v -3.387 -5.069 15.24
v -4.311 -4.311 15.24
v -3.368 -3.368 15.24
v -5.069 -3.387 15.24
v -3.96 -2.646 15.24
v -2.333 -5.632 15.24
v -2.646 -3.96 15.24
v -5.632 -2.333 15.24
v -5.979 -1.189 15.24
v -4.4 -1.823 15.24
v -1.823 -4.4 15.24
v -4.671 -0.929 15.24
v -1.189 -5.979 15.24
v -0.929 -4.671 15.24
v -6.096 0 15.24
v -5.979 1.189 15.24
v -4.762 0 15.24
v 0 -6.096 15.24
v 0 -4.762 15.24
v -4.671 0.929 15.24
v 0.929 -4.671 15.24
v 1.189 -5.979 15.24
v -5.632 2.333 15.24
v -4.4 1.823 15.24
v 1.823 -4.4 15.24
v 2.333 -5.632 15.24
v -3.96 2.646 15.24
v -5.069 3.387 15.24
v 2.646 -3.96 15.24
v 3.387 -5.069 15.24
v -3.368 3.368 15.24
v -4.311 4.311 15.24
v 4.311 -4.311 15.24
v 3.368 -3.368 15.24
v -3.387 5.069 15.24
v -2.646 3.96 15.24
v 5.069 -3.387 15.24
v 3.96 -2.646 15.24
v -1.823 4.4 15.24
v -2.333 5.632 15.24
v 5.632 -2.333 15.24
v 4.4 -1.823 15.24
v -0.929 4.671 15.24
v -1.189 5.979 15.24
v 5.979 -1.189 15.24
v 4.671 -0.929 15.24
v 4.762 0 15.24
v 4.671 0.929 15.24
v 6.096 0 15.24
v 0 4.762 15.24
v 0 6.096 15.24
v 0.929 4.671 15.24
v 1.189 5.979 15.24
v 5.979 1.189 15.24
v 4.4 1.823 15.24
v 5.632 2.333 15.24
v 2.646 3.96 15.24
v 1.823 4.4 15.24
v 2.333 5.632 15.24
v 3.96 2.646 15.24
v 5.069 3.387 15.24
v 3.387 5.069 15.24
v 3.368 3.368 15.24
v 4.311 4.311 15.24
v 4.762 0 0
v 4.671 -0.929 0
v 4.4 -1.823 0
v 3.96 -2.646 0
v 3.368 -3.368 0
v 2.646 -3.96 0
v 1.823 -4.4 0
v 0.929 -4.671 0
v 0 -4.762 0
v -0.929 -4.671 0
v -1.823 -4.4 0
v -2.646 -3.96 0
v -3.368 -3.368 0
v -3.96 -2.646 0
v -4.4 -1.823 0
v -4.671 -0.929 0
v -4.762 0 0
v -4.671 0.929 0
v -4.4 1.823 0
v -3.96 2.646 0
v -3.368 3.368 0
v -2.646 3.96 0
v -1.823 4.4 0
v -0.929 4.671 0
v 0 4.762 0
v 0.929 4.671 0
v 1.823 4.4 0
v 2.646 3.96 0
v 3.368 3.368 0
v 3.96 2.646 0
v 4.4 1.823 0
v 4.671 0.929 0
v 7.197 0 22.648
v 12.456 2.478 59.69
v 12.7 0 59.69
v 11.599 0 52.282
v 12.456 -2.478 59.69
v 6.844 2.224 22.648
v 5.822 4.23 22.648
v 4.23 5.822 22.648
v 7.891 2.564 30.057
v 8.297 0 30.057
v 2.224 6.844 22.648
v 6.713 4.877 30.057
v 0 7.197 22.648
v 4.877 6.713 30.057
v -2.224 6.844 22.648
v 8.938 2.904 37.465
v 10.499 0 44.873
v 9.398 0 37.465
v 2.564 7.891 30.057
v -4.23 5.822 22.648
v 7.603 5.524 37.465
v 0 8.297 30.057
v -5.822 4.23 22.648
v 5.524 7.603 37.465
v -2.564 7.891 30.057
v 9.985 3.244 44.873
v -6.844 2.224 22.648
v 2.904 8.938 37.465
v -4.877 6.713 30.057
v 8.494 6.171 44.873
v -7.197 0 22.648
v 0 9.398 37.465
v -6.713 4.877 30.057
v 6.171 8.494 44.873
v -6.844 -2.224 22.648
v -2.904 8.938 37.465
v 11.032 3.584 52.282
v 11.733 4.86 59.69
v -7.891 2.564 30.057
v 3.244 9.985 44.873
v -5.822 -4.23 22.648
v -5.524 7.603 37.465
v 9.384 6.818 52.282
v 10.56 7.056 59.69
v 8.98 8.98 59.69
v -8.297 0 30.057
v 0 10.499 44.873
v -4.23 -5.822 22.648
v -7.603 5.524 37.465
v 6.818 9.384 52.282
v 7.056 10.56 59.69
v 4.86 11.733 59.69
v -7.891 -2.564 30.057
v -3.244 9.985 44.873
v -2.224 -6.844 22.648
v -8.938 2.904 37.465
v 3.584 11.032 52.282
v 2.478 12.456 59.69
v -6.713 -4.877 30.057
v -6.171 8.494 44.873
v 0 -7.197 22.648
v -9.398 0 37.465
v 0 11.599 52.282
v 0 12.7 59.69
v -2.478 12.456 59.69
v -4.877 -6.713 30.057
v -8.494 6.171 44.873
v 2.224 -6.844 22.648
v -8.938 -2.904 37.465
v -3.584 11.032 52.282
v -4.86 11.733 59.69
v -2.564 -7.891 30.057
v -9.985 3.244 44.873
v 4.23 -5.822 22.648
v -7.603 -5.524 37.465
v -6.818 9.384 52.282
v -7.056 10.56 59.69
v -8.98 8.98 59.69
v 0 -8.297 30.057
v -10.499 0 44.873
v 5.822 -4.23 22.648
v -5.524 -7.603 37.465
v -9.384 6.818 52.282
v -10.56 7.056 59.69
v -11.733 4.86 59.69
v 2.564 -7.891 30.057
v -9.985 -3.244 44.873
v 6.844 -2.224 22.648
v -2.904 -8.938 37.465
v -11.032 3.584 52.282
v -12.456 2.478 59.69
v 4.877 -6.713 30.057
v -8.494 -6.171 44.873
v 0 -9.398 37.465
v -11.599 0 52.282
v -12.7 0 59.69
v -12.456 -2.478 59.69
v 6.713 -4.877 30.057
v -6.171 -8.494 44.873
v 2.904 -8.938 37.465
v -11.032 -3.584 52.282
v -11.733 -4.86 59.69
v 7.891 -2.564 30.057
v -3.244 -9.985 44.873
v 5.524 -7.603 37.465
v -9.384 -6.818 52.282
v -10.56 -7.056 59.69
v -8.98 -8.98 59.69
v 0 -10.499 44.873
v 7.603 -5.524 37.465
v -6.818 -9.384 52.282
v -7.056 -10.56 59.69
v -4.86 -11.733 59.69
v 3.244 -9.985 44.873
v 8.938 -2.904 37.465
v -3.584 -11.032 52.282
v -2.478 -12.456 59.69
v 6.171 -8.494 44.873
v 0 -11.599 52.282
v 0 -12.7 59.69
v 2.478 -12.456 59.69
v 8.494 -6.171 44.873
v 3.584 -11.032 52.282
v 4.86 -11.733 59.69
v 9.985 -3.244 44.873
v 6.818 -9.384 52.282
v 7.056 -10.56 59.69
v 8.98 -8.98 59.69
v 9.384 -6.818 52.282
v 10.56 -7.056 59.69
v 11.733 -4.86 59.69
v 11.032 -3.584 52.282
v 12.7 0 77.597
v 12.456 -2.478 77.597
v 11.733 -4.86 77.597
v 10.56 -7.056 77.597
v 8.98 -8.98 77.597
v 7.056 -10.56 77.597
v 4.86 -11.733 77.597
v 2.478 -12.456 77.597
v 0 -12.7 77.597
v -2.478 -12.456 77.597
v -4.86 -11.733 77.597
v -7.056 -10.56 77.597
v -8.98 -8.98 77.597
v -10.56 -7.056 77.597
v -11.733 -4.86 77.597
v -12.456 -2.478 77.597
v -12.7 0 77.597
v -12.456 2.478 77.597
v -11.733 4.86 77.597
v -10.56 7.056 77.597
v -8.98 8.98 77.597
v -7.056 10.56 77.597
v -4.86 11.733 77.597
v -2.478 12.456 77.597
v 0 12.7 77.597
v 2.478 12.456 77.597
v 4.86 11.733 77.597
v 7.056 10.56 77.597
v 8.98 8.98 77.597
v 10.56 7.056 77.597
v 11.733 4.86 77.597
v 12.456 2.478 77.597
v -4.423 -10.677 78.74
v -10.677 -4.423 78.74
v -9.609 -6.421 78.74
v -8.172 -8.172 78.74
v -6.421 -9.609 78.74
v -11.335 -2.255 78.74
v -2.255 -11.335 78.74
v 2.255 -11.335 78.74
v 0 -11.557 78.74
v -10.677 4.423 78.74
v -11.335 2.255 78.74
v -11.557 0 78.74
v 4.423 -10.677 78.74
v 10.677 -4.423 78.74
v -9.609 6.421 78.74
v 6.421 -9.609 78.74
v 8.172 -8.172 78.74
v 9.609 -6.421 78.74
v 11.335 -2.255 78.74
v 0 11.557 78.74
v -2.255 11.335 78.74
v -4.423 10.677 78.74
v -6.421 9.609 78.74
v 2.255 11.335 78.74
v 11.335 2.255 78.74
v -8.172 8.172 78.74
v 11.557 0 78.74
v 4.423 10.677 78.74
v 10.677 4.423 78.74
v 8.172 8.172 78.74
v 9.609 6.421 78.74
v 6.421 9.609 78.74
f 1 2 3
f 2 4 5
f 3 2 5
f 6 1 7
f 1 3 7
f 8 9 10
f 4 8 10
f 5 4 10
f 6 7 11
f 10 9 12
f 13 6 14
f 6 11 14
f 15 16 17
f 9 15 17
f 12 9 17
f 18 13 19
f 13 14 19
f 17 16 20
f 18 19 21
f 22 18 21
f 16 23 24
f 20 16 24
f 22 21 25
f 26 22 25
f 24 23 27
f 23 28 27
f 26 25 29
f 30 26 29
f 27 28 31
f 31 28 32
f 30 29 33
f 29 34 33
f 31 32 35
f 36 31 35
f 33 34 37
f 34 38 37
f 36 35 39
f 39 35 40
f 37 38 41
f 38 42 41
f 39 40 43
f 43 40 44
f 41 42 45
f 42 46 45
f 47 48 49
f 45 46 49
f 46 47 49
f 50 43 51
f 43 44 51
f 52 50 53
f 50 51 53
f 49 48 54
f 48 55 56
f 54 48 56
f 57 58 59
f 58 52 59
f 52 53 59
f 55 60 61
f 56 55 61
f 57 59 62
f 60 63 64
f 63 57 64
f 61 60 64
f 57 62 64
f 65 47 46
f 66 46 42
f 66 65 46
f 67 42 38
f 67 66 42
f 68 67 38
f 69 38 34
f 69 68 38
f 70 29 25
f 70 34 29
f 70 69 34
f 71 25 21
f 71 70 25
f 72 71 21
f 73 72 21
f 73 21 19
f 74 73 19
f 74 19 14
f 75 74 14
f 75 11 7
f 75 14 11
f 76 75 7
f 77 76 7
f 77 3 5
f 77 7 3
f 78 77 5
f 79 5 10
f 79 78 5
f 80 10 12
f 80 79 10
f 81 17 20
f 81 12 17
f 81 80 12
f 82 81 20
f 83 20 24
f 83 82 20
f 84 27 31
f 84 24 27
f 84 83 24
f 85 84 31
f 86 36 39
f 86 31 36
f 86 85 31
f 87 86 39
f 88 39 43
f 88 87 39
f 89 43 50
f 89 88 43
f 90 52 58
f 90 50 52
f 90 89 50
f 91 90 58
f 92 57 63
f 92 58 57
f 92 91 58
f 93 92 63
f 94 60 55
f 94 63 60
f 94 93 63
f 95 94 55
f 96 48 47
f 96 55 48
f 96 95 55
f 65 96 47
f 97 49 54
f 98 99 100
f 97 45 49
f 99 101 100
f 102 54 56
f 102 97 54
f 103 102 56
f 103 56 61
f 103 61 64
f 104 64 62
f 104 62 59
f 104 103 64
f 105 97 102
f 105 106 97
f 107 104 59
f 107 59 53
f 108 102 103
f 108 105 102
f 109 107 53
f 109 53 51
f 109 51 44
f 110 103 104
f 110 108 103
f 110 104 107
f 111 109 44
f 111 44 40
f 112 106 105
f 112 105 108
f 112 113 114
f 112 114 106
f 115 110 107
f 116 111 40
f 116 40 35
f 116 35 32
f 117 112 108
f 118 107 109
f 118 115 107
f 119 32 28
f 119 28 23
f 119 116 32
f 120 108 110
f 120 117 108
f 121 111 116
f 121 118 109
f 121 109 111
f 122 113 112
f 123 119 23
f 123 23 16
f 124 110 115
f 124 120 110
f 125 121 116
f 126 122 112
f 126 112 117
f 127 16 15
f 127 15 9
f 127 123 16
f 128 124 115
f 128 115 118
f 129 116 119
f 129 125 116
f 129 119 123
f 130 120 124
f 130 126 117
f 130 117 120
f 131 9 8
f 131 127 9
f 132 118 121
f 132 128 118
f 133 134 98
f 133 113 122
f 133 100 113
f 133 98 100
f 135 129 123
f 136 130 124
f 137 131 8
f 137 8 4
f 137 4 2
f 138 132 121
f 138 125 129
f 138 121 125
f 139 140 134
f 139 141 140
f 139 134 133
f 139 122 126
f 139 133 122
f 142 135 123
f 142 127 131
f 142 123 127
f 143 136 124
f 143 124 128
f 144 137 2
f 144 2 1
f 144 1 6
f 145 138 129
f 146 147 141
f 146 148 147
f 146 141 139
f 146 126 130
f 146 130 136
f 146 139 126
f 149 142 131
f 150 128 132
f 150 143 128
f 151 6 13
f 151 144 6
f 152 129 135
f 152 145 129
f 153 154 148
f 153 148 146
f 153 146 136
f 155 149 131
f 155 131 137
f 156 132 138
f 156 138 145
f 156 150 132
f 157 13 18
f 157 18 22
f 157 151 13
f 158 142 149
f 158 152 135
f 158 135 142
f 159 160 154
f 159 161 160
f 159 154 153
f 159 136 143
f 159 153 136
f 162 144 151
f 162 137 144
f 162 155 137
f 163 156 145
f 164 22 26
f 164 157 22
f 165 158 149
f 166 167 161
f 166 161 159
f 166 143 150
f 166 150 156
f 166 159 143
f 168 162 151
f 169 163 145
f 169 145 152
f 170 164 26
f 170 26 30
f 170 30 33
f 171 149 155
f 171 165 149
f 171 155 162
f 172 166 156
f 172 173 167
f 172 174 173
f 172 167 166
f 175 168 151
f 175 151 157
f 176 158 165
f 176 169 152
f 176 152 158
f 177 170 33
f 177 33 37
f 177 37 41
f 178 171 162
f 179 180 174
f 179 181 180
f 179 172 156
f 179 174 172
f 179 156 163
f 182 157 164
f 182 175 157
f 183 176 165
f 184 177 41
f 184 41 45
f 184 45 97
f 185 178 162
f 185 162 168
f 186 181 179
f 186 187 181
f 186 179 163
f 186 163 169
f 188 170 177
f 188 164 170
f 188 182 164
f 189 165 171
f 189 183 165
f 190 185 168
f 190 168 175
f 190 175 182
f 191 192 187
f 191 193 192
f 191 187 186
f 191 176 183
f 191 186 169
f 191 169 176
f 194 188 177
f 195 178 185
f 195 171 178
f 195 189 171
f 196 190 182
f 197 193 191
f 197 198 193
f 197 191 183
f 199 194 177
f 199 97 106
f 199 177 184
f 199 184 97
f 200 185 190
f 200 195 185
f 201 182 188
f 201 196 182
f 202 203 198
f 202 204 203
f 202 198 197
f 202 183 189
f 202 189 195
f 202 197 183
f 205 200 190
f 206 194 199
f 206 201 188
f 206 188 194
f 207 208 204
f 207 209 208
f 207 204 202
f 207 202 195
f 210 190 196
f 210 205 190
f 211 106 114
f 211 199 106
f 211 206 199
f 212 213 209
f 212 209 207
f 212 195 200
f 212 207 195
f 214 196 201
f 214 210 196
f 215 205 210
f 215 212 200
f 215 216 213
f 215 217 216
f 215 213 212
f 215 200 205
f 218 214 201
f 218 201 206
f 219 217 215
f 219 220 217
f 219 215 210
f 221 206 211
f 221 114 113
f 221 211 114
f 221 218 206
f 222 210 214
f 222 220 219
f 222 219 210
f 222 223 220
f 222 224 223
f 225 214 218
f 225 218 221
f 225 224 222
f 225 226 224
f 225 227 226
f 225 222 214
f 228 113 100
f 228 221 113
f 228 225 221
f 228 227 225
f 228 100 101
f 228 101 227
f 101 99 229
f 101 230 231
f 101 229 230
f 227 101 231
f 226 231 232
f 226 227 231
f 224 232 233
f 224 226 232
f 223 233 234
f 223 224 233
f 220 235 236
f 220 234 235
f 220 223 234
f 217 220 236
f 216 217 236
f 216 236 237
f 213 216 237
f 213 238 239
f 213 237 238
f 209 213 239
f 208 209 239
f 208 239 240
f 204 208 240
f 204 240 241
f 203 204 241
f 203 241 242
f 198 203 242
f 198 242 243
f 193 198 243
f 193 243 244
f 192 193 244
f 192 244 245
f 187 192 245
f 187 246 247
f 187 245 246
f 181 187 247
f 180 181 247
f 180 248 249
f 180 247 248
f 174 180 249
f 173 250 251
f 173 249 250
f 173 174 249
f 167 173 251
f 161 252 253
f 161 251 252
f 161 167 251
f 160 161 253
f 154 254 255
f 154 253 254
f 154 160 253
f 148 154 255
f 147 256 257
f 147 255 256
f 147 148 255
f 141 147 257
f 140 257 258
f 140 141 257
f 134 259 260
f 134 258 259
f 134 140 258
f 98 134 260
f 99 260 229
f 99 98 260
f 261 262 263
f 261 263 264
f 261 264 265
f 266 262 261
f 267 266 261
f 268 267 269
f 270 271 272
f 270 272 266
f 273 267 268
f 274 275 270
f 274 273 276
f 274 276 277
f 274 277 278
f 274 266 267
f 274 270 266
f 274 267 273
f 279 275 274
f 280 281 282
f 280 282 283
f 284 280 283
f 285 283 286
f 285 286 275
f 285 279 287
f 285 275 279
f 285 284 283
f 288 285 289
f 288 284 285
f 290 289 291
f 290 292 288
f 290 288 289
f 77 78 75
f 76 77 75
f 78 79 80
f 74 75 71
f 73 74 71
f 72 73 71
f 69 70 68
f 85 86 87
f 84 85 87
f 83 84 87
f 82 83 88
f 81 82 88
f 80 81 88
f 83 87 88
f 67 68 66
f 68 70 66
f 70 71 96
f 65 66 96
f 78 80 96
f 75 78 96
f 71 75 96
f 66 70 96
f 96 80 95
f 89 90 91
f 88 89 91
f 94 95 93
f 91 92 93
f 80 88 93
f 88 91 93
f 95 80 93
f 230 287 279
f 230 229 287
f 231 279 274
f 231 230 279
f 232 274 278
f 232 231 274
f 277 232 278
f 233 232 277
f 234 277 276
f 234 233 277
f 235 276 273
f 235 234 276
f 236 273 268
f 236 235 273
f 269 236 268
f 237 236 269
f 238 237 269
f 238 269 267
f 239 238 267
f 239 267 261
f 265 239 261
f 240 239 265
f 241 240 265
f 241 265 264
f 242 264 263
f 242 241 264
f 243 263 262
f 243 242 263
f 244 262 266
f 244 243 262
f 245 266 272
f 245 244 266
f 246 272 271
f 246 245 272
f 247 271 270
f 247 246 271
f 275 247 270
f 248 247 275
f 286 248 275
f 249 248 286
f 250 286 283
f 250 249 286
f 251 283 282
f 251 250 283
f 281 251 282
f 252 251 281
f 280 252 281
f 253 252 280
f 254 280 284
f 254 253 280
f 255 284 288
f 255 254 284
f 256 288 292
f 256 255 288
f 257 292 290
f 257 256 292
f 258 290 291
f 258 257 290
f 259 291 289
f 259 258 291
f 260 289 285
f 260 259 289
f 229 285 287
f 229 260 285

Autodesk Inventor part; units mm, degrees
ref_plane "YZ Plane" through (0, 0, 0) normal (1, 0, 0) x (0, 1, 0)
ref_plane "XZ Plane" through (0, 0, 0) normal (0, 1, 0) x (-1, 0, 0)
ref_plane "XY Plane" through (0, 0, 0) normal (0, 0, 1) x (1, 0, 0)
sketch "Sketch1" plane through (0, 0, 0) normal (0, 0, 1) x (1, 0, 0)
  circle A0 centre (0, 0) radius 4.7625
  dimension "d0" = 9.525
extrude "Extrusion1" add sketch "Sketch1" along normal blind 15.24
sketch "Sketch2" plane through (0, 0, 15.24) normal (0, 0, 1) x (1, 0, 0)
  circle A0 centre (0, 0) radius 6.096
  dimension "d3" = 12.192
extrude "Extrusion2" add sketch "Sketch2" along normal blind 44.45
sketch "Sketch3" plane through (0, 0, 59.69) normal (0, 0, 1) x (1, 0, 0)
  circle A0 centre (0, 0) radius 12.7
  dimension "d7" = 25.4
loft "Loft1" add profiles "Sketch3" section 2 edges at (-6.096, 0, 15.24)
sketch "Sketch4" plane through (0, 0, 59.69) normal (0, 0, 1) x (1, 0, 0)
  circle A0 centre (0, 0) radius 12.7
extrude "Extrusion3" add sketch "Sketch4" along normal blind 19.05
chamfer "Chamfer1" distance 1.143 angle 45 1 edges at (-12.7, 0, 78.74)
properties part number "JB_CAD_FinalPt2"
